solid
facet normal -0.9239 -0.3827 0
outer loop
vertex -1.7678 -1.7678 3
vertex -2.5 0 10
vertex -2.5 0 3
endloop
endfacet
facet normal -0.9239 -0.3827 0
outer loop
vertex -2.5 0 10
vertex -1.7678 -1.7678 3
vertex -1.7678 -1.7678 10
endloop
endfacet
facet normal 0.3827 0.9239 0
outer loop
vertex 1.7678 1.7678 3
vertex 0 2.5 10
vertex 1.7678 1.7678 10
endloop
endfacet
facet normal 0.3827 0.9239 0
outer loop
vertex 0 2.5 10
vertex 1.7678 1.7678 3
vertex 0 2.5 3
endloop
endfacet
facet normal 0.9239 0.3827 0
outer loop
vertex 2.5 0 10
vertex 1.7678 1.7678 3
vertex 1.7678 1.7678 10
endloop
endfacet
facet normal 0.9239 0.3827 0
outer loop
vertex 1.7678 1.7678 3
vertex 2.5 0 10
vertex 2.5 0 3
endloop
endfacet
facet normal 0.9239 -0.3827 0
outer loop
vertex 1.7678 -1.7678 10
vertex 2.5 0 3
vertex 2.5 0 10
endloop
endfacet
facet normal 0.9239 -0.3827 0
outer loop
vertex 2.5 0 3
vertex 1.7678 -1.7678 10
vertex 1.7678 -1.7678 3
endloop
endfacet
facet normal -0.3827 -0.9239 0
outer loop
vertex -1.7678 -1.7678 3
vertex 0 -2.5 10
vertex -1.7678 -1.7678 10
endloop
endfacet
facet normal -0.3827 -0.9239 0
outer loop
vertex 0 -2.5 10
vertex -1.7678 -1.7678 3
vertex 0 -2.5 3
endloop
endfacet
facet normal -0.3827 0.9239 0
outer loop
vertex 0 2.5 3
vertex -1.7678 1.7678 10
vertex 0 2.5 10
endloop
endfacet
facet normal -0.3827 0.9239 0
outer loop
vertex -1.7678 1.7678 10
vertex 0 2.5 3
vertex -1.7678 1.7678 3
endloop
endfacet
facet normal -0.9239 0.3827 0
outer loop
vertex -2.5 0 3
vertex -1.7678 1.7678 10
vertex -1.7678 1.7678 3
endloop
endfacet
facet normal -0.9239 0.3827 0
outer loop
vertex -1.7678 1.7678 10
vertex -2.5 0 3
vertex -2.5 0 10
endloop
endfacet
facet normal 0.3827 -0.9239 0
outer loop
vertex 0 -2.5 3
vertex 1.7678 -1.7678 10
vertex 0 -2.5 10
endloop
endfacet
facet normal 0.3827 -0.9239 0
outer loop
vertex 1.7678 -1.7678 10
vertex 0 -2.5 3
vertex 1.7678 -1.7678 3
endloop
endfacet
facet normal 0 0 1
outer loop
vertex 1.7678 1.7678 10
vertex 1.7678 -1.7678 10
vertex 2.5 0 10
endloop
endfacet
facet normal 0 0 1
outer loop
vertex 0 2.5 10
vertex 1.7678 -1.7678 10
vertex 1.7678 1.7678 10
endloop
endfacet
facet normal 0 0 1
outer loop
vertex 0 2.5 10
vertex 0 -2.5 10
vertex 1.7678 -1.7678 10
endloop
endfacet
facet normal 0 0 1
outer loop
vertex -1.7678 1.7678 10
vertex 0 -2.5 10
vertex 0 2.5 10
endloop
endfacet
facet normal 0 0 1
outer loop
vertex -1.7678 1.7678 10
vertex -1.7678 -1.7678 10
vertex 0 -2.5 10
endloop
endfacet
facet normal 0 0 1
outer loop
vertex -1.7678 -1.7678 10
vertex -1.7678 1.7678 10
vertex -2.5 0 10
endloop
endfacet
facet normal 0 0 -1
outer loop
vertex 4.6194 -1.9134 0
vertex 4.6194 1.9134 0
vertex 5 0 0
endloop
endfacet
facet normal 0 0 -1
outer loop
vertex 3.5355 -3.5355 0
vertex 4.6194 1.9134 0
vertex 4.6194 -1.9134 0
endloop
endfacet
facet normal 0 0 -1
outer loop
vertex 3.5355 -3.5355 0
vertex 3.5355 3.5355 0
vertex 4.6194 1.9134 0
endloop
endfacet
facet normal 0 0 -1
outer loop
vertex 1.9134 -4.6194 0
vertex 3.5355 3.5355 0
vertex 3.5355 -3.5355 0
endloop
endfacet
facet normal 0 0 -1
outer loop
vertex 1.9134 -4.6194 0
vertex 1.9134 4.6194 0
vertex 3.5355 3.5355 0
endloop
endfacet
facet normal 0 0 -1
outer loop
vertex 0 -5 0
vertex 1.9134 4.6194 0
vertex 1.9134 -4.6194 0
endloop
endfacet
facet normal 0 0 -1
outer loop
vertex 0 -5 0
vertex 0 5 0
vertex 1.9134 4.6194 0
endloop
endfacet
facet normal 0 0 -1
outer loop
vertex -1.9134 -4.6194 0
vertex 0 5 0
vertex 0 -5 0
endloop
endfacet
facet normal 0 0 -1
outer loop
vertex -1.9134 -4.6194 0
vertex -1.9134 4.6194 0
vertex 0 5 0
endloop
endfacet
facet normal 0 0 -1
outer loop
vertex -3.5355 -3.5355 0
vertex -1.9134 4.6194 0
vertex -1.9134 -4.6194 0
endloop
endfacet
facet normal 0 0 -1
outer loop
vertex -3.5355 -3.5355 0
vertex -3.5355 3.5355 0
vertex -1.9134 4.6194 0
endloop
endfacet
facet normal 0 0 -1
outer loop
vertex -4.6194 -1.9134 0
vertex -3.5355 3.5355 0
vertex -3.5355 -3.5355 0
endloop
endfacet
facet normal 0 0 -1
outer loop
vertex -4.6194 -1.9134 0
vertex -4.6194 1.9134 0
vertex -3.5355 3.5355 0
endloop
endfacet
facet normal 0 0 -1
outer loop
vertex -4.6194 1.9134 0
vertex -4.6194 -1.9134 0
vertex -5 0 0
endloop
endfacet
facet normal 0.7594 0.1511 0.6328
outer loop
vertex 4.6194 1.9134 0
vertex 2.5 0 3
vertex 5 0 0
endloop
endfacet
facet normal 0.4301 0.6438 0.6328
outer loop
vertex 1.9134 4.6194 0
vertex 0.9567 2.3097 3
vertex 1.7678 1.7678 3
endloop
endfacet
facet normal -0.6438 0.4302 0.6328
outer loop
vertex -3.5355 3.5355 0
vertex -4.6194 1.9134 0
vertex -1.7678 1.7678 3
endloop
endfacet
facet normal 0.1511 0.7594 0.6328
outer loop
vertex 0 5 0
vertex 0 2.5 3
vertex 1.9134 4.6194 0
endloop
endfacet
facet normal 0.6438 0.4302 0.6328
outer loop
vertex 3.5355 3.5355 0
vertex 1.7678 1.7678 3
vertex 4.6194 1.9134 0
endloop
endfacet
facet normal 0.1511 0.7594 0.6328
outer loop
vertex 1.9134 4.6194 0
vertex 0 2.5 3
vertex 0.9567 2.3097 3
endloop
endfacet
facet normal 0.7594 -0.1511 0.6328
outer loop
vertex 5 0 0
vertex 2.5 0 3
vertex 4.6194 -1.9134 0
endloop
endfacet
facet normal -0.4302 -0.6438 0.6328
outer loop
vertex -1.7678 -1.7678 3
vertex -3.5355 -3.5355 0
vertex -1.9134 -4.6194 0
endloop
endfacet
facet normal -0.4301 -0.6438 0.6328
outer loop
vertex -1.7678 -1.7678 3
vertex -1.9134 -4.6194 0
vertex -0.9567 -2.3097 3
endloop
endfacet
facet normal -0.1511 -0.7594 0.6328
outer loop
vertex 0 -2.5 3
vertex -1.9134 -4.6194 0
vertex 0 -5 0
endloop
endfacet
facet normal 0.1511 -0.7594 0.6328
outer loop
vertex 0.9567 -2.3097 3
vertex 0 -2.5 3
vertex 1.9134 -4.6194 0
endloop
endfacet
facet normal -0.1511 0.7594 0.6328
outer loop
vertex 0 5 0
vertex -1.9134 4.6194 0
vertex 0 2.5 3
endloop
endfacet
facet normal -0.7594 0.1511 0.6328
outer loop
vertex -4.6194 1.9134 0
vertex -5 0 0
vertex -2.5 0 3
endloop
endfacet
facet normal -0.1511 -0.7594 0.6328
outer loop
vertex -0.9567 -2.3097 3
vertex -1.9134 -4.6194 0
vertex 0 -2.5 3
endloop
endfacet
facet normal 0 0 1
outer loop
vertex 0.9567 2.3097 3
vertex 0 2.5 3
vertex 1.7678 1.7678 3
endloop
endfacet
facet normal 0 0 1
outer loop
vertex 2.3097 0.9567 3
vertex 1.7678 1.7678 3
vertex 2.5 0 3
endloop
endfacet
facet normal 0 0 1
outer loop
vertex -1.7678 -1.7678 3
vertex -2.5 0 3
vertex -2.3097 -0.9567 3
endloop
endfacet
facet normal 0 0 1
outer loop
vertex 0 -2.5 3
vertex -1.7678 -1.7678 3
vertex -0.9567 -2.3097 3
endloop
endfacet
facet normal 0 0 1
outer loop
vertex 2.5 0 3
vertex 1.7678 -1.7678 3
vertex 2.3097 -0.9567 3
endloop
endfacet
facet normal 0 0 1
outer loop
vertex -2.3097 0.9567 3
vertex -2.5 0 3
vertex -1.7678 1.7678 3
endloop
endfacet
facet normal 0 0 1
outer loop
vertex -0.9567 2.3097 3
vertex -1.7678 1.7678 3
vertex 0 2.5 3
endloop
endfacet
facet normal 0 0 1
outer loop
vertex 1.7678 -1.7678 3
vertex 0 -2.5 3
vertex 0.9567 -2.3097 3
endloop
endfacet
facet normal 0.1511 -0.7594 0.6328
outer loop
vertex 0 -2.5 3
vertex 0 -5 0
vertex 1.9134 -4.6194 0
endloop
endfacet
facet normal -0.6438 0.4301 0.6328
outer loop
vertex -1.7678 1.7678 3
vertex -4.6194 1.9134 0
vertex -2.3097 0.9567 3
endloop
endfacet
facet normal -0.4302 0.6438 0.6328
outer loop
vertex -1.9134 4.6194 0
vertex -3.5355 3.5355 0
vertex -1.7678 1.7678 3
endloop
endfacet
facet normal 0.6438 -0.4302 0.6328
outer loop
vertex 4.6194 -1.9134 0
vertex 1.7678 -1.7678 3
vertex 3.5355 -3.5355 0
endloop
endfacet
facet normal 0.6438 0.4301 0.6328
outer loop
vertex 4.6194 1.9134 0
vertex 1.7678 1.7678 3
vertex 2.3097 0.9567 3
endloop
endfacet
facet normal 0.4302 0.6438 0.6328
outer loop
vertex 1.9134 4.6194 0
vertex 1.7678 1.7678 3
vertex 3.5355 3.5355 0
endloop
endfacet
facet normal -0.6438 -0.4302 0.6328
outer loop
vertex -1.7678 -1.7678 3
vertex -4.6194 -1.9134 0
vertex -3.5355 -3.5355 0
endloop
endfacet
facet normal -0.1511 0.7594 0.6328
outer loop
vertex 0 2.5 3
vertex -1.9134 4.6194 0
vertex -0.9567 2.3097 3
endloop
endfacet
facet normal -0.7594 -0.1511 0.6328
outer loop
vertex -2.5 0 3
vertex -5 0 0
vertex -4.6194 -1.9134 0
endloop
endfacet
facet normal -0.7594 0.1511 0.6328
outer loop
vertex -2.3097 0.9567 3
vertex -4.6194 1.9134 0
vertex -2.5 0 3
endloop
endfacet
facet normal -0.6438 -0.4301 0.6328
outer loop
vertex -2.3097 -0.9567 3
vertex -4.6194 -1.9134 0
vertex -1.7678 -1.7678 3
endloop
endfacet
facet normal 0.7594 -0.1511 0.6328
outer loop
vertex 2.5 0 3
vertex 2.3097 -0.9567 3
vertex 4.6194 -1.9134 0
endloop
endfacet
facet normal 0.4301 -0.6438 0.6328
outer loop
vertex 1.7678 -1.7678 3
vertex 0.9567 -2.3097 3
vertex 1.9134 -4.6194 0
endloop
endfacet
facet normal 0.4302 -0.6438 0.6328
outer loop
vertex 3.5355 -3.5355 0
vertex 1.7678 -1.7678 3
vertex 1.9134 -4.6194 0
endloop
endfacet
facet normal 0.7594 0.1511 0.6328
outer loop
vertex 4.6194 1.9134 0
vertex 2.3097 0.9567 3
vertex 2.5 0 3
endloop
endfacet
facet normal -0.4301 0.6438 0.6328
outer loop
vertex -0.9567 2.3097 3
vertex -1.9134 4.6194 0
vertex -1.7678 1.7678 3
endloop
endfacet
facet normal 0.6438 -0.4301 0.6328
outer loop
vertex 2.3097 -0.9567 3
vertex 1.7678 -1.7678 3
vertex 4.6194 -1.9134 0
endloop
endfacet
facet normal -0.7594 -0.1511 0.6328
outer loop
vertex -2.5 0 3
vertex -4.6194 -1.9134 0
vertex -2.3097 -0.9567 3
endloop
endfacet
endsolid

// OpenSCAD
module vis(thickness,deep, radius){
	union(){
			cylinder(deep,radius,radius,false);
			cylinder(thickness,2*radius,radius,false);
	}
};

vis(3,10,2.5);
